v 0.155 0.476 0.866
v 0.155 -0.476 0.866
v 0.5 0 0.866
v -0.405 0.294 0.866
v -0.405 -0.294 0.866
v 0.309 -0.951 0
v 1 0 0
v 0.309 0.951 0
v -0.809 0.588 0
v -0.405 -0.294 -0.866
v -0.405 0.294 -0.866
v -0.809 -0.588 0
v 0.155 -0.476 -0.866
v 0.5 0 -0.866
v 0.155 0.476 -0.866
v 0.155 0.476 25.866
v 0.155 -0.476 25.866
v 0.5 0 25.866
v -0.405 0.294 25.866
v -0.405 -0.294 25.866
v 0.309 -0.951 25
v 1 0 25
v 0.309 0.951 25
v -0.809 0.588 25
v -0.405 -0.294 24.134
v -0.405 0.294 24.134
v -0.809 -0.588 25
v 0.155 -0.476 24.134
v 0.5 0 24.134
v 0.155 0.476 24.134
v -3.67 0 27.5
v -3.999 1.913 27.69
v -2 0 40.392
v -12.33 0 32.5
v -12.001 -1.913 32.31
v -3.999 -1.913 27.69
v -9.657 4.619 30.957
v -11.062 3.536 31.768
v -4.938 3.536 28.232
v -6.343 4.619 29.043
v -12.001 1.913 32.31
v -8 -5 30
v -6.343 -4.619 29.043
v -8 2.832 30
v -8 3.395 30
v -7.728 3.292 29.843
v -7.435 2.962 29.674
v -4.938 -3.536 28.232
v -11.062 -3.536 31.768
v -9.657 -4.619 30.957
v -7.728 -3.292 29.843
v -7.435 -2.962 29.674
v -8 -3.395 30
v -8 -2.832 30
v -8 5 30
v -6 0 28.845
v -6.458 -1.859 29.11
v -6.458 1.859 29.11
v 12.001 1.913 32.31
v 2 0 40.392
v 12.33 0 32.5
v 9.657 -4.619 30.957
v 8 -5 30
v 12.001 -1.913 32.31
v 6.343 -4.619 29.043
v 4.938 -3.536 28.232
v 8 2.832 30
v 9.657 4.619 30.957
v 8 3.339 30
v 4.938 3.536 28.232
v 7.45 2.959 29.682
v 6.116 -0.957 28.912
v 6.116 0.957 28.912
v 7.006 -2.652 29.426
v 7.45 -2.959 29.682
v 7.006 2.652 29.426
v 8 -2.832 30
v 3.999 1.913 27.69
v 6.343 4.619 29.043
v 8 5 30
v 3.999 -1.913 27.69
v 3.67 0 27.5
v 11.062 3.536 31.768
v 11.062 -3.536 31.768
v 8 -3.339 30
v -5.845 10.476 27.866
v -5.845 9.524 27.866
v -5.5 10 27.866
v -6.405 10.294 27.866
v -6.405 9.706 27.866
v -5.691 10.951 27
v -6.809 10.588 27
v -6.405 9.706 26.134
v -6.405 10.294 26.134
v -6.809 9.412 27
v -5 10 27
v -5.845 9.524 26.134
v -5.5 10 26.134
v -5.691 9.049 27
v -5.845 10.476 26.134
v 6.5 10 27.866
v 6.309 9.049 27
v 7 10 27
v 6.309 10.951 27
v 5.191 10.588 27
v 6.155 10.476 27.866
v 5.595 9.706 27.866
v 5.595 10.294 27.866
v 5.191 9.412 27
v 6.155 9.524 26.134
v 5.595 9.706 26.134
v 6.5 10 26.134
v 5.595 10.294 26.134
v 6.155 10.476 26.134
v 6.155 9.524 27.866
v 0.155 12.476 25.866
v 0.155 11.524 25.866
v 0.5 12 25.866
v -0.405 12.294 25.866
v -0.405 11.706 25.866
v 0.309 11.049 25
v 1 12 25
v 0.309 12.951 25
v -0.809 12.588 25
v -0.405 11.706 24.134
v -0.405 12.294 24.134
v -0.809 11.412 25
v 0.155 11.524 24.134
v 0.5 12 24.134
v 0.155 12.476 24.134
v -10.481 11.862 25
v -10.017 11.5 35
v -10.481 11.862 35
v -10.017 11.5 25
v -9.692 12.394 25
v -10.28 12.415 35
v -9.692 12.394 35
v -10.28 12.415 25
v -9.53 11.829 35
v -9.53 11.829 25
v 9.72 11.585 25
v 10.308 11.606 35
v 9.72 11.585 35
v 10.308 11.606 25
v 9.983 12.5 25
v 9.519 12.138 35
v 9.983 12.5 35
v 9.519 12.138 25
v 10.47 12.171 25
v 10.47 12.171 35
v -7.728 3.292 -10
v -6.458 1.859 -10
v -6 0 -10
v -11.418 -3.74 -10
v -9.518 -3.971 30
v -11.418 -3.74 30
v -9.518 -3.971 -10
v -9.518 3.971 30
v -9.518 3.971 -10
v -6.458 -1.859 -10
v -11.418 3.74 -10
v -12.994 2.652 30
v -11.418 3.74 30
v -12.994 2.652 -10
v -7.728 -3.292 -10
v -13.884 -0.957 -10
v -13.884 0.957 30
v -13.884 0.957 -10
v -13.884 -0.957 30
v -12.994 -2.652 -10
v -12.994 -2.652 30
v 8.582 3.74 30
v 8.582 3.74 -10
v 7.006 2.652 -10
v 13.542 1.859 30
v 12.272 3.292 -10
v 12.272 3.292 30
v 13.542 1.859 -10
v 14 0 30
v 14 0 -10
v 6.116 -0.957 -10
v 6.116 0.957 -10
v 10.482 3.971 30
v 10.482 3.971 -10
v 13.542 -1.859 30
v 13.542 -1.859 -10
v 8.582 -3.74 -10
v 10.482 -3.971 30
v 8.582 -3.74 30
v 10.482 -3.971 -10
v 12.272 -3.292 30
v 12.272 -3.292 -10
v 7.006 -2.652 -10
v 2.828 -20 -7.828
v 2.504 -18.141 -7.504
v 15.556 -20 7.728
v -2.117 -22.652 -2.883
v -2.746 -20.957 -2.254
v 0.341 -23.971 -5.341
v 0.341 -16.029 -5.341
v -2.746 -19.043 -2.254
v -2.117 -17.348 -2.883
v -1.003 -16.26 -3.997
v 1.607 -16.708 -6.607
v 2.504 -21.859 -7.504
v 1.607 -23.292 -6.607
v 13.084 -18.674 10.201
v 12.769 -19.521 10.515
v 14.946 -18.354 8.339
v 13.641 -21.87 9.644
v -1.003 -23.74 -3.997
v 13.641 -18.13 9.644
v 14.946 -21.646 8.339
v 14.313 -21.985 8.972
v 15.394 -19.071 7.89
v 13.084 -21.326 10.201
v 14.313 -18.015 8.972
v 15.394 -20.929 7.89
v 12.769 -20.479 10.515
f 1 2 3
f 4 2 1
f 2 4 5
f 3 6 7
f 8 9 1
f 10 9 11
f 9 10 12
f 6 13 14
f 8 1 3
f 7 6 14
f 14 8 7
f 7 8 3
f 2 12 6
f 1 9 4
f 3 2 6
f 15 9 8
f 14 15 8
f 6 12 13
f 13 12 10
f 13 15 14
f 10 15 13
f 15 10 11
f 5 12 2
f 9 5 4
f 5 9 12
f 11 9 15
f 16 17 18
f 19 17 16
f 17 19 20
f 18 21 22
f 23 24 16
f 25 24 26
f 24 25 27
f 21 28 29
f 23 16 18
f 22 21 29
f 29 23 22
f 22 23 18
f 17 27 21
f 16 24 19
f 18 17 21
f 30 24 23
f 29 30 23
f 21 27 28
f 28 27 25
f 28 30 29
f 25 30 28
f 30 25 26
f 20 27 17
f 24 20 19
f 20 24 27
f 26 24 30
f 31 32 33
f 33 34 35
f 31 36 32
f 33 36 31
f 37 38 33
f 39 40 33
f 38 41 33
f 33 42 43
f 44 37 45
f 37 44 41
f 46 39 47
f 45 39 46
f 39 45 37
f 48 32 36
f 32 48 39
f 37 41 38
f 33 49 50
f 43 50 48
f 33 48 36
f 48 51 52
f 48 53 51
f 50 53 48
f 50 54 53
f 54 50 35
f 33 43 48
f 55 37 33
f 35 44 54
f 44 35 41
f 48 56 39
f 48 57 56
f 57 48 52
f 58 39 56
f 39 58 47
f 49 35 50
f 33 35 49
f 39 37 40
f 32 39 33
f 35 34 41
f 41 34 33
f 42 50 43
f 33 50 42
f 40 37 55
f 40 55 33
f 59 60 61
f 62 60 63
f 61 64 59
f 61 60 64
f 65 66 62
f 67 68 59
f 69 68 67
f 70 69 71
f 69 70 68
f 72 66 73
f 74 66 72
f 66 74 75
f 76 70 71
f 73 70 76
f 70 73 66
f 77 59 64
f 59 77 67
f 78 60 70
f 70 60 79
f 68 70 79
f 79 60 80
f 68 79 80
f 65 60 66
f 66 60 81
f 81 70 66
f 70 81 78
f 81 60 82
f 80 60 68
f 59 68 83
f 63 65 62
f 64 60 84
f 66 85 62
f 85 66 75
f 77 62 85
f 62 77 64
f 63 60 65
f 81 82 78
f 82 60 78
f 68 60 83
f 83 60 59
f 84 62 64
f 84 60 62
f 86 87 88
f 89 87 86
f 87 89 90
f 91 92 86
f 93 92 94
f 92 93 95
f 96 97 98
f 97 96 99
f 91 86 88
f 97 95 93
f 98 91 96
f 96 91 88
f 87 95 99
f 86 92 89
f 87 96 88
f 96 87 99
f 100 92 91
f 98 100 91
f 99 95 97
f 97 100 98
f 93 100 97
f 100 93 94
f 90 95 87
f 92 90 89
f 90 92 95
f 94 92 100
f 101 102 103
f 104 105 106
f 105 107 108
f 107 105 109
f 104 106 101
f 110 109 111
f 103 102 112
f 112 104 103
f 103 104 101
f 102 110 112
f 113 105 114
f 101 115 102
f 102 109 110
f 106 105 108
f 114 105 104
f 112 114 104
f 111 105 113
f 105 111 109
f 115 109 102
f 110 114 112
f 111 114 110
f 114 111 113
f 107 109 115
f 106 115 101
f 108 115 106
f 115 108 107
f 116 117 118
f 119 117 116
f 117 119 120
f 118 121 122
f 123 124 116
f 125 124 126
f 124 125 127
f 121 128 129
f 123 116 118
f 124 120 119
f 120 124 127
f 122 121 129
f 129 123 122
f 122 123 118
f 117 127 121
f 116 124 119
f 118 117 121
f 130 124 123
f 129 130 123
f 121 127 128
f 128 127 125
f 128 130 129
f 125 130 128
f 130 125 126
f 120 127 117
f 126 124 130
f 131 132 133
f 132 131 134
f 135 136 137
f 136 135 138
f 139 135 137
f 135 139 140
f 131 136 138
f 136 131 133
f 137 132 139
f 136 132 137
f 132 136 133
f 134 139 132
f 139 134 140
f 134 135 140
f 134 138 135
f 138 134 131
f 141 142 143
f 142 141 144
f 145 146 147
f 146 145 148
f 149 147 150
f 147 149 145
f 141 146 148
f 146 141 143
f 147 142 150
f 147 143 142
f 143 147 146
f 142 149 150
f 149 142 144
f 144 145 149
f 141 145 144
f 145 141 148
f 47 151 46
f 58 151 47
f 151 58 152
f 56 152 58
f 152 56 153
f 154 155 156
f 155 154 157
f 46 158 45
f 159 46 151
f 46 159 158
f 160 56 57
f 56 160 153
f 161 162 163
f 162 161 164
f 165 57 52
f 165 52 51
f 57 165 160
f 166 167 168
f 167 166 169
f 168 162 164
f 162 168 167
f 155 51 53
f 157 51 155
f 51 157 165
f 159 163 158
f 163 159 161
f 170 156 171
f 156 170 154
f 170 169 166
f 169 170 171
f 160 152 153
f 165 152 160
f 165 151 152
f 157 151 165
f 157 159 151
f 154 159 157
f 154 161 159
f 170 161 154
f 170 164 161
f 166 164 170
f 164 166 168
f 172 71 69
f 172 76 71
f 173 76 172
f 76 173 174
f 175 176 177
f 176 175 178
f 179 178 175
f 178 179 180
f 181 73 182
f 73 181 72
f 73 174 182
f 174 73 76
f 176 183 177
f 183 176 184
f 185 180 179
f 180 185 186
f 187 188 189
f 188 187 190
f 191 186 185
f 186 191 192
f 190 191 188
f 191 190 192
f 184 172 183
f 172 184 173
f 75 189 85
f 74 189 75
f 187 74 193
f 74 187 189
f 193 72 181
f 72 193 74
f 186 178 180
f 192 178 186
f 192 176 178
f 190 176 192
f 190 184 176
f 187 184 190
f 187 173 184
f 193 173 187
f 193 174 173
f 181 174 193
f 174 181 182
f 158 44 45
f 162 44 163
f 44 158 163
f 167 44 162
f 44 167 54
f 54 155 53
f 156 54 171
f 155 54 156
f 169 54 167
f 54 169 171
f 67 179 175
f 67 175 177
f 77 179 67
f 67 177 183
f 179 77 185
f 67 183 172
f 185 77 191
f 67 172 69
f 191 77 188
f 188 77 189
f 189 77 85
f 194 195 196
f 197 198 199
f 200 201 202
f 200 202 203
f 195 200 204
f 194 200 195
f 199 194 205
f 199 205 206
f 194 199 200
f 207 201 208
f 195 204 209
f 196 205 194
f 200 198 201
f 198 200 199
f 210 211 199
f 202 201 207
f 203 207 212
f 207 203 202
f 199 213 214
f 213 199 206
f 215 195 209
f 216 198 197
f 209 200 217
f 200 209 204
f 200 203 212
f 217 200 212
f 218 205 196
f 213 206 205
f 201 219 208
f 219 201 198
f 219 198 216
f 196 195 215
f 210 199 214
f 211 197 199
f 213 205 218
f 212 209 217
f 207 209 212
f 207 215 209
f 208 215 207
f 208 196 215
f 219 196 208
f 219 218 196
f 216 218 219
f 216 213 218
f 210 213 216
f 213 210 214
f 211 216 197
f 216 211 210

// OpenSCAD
// Simple 3D cat model
// Body
color("gray")
difference() {
    sphere([0, 0, 0], 20);
    translate([0, 0, -20])
        cube([40, 40, 20], center = true);
}

// Head
color("gray")
translate([0, 0, 25])
    sphere([0, 0, 0], 15);

// Ears
color("gray")
translate([-8, 0, 30])
    rotate([0, 30, 0])
    cylinder(h = 12, r1 = 5, r2 = 0);
translate([8, 0, 30])
    rotate([0, -30, 0])
    cylinder(h = 12, r1 = 5, r2 = 0);

// Eyes
color("black")
translate([-6, 10, 27])
    sphere([0, 0, 0], 2);
translate([6, 10, 27])
    sphere([0, 0, 0], 2);

// Nose
color("pink")
translate([0, 12, 25])
    sphere([0, 0, 0], 3);

// Whiskers
color("black")
translate([-10, 12, 25])
    rotate([0, 0, -20])
    cylinder(h = 10, r = 0.5);
translate([10, 12, 25])
    rotate([0, 0, 20])
    cylinder(h = 10, r = 0.5);

// Legs
color("gray")
translate([-10, 0, -10])
    cylinder(h = 20, r = 4);
translate([10, 0, -10])
    cylinder(h = 20, r = 4);
translate([-10, 0, 10])
    cylinder(h = 20, r = 4);
translate([10, 0, 10])
    cylinder(h = 20, r = 4);

// Tail
color("gray")
translate([0, -20, -5])
    rotate([0, 45, 0])
    cylinder(h = 20, r1 = 4, r2 = 2);
